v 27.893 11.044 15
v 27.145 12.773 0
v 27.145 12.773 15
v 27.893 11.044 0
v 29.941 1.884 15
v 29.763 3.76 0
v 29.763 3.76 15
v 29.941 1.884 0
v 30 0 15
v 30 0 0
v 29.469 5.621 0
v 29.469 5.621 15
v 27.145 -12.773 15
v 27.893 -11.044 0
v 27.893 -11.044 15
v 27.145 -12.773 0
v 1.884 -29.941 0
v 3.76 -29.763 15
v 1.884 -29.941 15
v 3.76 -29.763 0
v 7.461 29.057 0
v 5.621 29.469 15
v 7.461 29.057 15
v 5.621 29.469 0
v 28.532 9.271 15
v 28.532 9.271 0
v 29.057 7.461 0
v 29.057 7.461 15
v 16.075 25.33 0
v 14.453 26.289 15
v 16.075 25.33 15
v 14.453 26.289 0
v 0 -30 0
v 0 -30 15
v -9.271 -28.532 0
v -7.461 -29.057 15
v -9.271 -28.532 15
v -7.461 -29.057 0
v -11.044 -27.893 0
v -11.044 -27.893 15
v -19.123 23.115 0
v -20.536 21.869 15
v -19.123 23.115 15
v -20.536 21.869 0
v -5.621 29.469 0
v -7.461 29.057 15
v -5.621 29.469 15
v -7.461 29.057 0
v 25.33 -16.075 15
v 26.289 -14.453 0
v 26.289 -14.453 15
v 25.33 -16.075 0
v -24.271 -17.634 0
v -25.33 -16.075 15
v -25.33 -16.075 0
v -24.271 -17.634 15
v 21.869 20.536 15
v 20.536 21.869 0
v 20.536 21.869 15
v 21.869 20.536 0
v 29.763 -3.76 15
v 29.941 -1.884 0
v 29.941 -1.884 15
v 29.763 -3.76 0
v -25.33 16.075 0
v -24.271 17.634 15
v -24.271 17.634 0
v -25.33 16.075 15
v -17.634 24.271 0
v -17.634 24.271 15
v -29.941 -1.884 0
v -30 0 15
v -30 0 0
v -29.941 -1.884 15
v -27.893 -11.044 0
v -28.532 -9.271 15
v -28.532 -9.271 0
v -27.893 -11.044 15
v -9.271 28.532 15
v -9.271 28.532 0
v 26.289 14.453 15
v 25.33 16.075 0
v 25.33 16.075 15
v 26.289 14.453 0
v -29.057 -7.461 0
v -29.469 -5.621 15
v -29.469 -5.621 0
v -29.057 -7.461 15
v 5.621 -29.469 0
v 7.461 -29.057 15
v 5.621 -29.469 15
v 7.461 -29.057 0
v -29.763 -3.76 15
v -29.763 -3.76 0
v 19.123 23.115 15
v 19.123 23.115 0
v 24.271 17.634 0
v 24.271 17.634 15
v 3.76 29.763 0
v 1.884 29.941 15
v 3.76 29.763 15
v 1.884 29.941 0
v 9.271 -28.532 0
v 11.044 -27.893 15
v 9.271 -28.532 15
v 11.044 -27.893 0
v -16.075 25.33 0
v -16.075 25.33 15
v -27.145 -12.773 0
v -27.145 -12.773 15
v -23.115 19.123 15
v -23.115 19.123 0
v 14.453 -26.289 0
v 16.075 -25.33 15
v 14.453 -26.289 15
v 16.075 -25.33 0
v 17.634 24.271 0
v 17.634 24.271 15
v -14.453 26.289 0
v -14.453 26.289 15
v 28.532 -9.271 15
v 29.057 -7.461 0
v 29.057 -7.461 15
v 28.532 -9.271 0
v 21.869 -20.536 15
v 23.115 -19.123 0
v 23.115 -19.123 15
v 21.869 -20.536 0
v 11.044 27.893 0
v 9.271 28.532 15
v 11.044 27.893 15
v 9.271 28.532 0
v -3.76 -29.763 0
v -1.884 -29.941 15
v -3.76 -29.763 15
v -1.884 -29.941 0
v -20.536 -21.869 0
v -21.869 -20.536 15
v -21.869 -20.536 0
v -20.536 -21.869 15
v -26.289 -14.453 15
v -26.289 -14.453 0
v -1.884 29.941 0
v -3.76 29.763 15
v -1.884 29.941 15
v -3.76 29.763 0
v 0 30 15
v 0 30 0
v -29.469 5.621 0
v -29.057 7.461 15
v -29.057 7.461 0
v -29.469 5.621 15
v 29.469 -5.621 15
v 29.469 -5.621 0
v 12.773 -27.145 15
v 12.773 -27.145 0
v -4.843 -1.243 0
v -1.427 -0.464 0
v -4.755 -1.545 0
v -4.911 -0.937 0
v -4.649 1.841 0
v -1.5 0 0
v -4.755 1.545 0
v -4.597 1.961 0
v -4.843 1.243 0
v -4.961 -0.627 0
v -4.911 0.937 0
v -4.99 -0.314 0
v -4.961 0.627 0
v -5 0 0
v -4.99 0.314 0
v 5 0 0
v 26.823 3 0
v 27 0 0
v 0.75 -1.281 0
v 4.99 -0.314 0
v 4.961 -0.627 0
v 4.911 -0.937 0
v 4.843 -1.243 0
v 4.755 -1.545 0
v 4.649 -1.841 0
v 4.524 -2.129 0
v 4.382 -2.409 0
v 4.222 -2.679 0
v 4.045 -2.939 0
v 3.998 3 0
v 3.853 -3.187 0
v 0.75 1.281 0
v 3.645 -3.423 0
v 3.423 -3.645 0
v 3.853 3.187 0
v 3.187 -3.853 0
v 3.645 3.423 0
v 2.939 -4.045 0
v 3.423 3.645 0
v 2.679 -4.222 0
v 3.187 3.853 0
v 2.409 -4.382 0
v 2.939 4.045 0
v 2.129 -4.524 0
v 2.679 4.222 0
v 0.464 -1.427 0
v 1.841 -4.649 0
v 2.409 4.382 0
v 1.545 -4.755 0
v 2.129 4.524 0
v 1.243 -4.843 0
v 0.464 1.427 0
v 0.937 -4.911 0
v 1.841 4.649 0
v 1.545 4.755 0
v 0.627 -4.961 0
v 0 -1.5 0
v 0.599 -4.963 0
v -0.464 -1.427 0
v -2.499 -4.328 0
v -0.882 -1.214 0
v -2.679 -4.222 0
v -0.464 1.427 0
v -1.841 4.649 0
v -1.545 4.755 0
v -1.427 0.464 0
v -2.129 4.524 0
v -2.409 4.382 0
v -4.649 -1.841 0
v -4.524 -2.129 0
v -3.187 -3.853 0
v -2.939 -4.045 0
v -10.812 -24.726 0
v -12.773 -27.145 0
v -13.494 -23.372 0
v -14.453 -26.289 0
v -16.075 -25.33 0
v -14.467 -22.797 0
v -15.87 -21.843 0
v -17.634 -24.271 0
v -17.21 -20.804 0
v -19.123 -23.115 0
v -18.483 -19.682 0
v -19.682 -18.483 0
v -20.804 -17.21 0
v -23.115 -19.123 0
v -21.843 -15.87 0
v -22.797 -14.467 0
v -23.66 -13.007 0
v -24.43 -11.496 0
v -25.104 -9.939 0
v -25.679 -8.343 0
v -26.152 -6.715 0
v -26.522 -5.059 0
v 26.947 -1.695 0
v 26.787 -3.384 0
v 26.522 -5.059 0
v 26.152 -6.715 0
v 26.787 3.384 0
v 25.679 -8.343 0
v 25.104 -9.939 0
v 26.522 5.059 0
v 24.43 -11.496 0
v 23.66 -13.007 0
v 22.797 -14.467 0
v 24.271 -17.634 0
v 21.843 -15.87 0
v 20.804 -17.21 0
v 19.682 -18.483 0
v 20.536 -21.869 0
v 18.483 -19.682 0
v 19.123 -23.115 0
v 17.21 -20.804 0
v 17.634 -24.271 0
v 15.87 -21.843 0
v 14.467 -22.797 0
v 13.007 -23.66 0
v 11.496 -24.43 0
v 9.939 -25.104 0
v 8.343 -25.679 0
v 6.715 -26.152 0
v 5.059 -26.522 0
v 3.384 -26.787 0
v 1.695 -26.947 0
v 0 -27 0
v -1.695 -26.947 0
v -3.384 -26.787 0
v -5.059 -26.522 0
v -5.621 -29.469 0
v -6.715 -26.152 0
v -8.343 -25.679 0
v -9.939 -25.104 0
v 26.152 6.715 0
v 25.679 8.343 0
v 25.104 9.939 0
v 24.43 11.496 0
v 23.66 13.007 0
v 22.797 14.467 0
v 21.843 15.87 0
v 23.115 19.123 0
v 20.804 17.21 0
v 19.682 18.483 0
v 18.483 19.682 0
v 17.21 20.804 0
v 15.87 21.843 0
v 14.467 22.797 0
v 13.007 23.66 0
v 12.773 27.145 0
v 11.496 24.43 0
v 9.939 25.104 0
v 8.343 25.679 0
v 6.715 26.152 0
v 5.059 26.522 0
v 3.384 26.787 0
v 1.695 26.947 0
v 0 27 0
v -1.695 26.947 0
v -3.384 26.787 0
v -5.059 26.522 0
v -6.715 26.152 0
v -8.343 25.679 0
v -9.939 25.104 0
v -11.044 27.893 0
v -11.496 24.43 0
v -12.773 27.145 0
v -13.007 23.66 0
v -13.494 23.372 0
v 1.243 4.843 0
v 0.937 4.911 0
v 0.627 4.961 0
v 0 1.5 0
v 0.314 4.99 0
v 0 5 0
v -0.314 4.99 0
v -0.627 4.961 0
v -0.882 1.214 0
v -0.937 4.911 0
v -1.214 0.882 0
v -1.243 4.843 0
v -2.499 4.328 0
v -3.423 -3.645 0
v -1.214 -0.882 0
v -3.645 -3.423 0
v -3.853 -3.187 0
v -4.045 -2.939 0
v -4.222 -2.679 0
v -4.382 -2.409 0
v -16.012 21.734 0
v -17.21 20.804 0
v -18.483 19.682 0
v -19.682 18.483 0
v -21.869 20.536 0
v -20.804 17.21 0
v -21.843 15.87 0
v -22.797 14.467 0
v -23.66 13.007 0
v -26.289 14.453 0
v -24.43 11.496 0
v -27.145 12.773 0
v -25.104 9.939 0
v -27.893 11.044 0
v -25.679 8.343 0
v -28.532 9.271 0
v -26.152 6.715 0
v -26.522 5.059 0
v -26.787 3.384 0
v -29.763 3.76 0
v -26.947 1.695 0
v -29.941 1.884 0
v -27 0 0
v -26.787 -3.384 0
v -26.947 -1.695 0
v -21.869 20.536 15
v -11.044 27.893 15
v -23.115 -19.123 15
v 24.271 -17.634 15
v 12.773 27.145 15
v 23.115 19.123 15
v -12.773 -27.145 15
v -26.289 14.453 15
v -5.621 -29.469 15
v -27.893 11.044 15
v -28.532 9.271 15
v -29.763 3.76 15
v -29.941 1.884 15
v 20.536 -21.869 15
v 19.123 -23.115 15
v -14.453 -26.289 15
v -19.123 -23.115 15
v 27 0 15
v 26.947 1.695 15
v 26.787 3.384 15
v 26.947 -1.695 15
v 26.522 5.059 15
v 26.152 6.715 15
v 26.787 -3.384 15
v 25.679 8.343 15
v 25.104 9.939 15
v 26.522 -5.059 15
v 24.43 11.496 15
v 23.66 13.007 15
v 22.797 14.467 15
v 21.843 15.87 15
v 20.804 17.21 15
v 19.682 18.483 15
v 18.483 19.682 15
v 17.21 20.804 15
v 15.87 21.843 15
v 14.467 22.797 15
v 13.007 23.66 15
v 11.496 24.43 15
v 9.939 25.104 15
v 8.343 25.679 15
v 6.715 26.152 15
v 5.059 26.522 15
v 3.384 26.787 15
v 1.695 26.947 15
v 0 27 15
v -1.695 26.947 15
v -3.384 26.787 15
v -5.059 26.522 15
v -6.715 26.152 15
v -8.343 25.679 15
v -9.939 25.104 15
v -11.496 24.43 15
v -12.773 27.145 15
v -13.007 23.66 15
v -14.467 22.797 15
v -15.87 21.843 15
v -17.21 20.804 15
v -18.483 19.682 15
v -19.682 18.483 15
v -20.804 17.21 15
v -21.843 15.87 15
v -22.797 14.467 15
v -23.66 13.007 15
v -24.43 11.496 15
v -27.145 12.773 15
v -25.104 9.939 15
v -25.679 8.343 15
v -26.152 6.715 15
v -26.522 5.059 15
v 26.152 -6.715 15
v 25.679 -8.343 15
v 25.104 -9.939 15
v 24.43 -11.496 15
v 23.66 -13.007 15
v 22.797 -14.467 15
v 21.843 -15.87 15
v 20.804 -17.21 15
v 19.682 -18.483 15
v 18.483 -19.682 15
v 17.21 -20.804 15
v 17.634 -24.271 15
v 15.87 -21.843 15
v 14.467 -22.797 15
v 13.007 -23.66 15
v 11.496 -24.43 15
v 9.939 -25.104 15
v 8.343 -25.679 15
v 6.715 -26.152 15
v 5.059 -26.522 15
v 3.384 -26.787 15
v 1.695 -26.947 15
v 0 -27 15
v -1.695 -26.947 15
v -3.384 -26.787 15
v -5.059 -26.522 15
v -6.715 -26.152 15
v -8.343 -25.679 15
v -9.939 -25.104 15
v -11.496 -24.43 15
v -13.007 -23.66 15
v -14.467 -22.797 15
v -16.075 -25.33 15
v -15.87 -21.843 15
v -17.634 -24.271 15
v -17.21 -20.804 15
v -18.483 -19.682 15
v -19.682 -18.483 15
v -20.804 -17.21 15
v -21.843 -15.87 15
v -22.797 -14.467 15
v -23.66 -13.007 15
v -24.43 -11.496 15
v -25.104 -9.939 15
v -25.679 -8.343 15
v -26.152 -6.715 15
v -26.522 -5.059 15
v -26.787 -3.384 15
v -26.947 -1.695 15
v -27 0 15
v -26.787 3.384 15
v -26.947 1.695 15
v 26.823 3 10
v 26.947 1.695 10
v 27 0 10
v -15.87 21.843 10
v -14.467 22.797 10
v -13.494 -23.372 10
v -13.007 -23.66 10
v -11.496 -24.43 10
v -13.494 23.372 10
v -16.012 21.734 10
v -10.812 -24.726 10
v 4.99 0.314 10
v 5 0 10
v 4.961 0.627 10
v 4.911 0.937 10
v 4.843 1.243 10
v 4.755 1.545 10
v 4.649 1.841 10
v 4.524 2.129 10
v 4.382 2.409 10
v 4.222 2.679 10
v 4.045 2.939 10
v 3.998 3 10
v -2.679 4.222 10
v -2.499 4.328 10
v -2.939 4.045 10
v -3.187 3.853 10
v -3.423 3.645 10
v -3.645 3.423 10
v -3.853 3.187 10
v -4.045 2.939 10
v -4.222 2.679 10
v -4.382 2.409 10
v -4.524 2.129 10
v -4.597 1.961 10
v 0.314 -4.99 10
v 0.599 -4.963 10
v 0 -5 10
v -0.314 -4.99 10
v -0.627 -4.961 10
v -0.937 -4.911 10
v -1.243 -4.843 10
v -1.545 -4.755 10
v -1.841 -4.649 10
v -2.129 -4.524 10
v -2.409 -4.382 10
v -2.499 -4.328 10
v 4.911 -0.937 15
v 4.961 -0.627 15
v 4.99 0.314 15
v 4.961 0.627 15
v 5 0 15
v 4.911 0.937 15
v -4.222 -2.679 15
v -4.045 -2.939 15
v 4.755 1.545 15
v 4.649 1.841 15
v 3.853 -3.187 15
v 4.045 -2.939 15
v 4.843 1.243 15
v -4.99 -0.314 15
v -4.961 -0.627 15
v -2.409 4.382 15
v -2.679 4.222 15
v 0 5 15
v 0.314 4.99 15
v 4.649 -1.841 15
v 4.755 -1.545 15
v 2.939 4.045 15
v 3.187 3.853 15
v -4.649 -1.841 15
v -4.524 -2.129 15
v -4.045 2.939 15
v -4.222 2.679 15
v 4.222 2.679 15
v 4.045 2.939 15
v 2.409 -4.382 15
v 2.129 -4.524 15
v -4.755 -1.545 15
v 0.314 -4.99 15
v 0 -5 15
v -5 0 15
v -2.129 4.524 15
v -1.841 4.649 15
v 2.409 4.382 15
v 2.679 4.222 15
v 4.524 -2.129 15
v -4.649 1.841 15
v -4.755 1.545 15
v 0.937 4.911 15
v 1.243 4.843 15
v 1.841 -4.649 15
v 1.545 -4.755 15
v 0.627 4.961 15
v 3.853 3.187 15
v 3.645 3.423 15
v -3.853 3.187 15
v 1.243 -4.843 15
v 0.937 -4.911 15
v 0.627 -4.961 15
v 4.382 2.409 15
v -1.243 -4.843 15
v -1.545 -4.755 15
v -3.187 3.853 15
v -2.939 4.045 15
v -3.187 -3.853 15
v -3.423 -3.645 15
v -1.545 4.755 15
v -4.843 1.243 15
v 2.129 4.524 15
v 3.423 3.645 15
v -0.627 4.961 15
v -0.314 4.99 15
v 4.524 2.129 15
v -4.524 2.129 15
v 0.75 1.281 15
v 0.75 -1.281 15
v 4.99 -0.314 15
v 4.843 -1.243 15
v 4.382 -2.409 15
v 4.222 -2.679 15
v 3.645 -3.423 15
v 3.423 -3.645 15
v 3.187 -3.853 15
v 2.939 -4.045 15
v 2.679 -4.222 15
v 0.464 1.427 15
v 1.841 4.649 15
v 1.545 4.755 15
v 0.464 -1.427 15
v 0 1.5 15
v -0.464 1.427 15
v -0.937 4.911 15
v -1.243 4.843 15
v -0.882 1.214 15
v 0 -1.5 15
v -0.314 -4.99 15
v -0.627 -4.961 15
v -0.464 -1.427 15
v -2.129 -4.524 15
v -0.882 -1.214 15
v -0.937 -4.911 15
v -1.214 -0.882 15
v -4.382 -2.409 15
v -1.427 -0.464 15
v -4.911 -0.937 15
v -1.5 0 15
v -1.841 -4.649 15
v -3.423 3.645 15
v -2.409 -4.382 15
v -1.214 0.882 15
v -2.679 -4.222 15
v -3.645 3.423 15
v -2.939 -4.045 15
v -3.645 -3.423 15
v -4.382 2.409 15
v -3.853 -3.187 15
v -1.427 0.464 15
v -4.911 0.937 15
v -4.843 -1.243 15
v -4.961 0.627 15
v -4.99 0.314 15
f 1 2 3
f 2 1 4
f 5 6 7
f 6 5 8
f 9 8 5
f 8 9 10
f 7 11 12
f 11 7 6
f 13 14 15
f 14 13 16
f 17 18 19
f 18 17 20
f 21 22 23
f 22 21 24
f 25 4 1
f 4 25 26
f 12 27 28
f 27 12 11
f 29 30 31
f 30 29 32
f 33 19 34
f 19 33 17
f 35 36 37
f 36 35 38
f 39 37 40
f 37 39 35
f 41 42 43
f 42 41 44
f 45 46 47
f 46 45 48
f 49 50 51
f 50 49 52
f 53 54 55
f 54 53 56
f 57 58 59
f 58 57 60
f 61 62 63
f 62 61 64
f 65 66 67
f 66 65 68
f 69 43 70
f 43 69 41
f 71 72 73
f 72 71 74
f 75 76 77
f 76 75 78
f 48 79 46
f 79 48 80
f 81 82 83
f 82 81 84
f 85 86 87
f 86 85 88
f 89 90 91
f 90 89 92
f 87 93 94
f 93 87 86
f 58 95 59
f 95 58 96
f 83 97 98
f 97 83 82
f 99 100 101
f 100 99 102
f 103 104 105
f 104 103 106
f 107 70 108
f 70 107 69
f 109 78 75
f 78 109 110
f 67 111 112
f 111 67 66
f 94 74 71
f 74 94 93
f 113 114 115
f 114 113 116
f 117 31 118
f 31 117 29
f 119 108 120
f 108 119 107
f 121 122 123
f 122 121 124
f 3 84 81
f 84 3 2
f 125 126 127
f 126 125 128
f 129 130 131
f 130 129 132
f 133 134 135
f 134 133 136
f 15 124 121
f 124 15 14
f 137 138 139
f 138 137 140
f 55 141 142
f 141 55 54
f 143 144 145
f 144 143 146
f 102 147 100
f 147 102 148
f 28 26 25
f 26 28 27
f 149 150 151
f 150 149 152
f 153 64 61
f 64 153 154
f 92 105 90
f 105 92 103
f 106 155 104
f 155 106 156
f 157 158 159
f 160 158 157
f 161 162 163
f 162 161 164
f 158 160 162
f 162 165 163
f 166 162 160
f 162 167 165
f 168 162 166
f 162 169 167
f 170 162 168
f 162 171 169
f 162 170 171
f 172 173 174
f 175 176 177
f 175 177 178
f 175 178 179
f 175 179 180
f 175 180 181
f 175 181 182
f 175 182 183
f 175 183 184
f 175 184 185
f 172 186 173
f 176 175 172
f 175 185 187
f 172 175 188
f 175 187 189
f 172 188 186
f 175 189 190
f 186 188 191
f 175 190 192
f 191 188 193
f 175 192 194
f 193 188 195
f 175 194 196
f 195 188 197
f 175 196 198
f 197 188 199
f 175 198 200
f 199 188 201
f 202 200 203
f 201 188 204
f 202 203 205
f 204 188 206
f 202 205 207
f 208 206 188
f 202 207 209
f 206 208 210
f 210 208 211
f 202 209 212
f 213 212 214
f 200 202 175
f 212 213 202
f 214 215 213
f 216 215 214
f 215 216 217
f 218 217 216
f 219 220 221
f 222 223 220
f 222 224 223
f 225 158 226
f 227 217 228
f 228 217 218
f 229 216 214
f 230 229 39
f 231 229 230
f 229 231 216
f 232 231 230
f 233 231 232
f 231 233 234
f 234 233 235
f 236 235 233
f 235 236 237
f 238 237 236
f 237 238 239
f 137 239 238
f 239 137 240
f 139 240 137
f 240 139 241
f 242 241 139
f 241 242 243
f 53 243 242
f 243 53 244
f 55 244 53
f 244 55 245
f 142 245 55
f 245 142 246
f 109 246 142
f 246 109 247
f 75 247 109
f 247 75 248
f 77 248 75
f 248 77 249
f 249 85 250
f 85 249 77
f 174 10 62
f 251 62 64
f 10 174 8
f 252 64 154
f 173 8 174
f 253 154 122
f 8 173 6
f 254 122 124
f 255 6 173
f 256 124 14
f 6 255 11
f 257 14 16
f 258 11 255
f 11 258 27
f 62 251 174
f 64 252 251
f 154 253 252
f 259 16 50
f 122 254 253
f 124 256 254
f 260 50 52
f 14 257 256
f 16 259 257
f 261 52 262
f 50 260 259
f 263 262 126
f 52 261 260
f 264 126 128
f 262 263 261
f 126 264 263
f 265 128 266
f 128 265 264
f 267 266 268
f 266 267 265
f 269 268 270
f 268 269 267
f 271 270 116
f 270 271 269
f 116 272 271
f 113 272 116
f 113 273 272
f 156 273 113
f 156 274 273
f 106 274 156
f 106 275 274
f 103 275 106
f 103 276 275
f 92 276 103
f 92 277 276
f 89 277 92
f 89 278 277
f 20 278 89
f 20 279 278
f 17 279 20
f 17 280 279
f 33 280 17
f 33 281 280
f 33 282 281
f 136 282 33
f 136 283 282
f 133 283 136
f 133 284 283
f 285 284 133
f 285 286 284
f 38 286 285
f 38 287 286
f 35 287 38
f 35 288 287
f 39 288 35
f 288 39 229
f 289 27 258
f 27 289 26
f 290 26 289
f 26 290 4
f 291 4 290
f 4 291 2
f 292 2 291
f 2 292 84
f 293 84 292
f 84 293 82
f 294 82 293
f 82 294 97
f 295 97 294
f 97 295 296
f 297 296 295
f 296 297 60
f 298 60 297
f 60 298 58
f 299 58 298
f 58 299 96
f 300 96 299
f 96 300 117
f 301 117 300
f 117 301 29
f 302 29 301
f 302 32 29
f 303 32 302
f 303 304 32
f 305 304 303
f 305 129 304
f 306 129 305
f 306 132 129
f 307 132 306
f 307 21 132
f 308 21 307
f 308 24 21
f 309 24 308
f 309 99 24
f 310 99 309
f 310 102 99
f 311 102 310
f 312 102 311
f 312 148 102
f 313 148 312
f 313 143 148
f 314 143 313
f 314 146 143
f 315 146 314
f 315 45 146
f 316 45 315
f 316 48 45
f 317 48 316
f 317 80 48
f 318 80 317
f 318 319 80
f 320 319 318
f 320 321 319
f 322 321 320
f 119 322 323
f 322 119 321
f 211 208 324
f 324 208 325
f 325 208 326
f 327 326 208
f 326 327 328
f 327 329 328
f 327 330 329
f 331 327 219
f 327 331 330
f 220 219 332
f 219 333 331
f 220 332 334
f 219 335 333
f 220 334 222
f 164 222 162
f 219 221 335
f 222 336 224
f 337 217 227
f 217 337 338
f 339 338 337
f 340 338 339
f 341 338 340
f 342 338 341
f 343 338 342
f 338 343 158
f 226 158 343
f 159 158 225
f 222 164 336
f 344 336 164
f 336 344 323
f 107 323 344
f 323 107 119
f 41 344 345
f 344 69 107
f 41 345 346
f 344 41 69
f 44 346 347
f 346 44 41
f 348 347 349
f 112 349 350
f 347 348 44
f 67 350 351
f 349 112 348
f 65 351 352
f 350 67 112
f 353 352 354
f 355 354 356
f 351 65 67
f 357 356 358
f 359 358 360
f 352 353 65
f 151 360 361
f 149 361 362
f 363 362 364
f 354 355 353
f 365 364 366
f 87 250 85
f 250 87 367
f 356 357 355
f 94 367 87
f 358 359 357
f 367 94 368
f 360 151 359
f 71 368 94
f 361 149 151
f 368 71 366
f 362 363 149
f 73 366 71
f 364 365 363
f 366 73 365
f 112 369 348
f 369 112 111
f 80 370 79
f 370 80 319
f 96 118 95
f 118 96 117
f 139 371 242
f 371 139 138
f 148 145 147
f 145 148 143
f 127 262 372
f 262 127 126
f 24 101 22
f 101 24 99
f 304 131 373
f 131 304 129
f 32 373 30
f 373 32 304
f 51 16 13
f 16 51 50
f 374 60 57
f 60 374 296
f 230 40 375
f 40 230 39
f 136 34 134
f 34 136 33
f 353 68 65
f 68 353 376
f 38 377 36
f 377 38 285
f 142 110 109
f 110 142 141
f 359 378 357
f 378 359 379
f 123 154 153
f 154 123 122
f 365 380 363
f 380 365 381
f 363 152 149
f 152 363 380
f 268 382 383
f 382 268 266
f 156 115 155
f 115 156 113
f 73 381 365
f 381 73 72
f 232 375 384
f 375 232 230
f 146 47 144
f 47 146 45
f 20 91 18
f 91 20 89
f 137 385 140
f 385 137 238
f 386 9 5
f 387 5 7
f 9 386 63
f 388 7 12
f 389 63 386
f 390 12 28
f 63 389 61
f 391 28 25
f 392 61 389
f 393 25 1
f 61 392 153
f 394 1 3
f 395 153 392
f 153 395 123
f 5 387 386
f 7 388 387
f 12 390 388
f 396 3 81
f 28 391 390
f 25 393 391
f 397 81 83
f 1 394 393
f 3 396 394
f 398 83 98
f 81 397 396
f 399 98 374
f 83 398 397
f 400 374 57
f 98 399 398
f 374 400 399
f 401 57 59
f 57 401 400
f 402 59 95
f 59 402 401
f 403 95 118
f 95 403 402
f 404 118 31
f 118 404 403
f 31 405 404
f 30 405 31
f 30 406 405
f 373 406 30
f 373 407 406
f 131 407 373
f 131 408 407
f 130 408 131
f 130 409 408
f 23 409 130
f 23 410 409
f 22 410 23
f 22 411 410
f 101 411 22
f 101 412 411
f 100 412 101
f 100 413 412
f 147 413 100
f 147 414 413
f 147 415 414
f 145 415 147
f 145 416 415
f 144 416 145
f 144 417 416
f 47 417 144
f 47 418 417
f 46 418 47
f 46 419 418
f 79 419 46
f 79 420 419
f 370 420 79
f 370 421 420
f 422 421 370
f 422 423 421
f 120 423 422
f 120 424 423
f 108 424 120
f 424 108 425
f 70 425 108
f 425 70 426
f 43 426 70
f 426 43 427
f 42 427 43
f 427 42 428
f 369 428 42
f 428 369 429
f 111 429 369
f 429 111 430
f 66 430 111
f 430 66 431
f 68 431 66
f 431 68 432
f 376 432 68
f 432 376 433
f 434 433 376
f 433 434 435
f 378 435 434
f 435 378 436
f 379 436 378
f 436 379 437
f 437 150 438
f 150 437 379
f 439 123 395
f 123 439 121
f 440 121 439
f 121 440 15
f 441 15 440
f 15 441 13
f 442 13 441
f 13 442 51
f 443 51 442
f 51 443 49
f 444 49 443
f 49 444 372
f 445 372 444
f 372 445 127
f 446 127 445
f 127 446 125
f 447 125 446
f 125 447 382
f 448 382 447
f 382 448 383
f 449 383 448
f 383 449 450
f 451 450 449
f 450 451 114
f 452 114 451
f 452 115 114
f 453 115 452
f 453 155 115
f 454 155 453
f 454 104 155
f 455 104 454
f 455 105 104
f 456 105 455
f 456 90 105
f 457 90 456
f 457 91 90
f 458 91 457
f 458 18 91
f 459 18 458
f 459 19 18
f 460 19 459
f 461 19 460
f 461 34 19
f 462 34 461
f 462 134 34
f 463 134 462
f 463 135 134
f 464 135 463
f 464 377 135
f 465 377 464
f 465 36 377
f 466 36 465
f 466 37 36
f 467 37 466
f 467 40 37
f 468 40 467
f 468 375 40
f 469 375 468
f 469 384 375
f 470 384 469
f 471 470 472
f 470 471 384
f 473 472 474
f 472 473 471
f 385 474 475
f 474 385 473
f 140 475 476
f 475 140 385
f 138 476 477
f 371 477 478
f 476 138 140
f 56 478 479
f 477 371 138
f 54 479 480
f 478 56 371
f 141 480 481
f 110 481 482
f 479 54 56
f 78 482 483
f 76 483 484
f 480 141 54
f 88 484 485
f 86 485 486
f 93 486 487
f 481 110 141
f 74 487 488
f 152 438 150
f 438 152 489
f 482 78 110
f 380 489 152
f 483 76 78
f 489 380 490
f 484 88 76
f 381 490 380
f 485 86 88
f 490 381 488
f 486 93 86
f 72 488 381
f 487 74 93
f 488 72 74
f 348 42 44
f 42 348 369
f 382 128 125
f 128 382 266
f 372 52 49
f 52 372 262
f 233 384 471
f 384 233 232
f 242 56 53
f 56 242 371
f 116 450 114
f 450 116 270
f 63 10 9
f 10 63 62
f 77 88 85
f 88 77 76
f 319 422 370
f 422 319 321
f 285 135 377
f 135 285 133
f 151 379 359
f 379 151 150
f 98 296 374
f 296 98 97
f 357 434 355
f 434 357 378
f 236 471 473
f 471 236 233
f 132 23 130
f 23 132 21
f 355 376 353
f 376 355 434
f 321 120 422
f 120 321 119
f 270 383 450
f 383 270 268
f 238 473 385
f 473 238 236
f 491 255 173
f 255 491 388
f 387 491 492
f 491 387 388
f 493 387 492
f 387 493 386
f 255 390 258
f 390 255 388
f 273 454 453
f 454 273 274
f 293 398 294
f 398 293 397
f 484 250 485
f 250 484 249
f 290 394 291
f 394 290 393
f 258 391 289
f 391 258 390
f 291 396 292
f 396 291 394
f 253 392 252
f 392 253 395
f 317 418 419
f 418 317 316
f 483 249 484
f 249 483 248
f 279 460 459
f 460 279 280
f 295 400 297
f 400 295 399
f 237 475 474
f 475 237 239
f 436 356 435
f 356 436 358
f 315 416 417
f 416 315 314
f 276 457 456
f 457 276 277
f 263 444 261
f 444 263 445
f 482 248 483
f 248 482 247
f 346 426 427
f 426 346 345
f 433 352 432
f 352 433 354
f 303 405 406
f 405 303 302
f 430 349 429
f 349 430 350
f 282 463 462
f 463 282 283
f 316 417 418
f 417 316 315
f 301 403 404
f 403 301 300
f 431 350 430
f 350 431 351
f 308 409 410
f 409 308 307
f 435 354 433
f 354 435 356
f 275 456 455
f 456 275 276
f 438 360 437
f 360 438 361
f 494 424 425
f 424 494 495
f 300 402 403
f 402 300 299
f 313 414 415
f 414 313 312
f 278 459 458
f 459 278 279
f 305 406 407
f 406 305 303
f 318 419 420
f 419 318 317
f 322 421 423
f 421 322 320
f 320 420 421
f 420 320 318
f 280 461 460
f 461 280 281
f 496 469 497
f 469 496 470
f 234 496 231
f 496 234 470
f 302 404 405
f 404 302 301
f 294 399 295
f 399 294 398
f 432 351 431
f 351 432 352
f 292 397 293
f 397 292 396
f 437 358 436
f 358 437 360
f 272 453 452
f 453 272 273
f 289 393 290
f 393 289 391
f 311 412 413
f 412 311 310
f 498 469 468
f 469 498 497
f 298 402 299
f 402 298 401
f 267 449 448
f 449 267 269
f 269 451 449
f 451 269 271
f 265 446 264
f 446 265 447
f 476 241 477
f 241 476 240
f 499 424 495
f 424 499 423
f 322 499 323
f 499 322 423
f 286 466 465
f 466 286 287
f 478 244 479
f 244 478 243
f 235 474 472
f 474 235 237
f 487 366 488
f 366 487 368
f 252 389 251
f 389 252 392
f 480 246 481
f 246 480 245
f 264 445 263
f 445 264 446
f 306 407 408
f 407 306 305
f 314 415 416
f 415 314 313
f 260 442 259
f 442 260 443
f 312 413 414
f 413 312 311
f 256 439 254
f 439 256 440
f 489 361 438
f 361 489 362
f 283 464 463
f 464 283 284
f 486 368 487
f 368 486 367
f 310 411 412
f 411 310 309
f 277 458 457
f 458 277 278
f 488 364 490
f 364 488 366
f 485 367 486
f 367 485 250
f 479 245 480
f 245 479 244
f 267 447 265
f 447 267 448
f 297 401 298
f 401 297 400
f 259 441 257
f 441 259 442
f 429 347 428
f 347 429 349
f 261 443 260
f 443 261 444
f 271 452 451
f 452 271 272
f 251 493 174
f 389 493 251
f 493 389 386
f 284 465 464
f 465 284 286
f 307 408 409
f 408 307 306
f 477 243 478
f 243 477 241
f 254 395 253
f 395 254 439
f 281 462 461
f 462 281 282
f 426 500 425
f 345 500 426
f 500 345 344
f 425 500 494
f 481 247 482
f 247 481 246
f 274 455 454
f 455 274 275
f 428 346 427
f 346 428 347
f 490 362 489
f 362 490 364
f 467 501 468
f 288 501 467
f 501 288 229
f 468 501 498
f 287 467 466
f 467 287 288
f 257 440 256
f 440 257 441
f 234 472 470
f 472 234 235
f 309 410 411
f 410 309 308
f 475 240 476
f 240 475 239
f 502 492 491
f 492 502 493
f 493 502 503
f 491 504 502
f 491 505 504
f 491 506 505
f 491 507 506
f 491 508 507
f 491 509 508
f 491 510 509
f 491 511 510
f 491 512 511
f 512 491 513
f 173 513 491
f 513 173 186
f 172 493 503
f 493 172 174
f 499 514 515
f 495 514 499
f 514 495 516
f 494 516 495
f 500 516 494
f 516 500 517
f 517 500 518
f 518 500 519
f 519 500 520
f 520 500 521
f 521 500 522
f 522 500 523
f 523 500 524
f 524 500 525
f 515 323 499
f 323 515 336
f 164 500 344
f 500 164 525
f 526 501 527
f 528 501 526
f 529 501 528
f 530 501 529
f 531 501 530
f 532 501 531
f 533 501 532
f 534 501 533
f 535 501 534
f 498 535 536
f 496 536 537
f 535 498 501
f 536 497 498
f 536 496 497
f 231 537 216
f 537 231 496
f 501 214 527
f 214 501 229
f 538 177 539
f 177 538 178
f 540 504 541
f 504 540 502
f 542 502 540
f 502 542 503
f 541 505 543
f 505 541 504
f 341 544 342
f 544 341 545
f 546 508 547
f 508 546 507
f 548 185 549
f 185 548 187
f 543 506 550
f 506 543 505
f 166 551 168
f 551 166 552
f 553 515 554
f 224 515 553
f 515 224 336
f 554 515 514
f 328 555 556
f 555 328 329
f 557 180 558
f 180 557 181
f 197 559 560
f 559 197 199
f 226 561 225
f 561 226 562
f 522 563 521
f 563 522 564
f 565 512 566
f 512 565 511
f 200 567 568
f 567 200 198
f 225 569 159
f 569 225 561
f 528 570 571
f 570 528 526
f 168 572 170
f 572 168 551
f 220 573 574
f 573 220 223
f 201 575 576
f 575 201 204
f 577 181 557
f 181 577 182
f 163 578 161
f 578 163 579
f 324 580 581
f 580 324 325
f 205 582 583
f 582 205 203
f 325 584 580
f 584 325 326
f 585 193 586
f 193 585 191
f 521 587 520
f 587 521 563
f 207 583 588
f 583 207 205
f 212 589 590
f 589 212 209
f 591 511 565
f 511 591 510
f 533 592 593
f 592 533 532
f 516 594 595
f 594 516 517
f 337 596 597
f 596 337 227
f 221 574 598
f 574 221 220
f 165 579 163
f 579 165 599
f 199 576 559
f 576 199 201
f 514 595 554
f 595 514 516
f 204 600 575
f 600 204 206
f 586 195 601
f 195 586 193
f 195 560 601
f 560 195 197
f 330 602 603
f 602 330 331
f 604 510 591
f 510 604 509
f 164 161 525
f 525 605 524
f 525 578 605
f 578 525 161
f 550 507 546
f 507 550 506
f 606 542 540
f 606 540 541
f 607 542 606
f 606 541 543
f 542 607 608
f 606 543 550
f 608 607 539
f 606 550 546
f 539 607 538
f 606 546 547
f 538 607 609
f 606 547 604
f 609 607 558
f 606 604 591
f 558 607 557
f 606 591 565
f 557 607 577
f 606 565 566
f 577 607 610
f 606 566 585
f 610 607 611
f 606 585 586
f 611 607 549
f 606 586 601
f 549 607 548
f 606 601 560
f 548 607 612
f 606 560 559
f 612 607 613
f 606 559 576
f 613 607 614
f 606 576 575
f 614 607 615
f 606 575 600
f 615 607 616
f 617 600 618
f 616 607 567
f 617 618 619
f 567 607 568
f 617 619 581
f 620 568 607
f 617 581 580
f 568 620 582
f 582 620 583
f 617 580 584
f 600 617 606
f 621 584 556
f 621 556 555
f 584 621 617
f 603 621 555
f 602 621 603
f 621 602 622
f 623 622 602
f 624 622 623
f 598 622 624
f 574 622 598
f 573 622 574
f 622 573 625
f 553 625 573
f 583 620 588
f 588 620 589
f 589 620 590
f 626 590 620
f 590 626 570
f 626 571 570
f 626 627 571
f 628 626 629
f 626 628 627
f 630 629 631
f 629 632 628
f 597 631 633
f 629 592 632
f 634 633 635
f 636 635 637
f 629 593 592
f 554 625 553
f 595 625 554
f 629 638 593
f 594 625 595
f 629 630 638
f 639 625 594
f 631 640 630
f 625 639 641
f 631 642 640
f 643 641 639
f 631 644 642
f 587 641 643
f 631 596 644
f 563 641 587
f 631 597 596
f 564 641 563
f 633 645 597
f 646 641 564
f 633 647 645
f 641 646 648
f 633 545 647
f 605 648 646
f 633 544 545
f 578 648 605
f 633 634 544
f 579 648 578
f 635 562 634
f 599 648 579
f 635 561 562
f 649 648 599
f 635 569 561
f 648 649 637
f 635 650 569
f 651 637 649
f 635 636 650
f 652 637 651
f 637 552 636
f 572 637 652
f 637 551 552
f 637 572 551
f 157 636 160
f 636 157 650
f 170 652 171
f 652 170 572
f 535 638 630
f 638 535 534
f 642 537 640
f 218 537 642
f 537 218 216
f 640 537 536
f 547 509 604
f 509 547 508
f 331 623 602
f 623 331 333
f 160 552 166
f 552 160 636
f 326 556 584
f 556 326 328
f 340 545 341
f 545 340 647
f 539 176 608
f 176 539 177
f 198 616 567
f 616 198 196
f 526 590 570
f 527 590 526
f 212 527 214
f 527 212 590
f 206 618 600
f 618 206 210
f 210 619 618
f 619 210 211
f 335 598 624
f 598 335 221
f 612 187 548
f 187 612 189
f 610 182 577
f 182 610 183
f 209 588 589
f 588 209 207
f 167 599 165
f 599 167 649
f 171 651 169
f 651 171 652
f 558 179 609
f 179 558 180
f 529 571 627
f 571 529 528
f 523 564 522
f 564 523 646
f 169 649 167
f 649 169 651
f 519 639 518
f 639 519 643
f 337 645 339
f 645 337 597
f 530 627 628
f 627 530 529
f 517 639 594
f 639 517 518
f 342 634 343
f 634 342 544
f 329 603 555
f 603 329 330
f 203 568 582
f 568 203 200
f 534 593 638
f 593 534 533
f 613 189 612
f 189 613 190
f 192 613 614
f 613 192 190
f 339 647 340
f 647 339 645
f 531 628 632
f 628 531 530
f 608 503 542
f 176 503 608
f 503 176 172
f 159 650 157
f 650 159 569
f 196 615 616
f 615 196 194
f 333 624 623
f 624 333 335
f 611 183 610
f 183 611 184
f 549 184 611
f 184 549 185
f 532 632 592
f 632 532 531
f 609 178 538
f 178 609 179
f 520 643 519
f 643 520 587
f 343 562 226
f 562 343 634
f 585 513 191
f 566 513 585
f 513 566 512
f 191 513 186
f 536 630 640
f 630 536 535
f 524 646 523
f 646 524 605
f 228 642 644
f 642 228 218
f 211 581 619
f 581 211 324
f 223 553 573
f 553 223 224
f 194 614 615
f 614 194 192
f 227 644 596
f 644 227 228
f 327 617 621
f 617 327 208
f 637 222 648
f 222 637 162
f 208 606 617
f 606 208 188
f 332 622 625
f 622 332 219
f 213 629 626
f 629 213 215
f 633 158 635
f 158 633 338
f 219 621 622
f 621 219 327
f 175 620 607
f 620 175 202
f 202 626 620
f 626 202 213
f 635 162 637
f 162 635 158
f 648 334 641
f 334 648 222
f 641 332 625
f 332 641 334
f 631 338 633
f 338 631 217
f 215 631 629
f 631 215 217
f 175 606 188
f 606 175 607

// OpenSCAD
difference() {
  wheel();
  //generic_axis();
  //motor1_axis();
  //motor2_axis();
  //motor3_axis();
  motor4_axis();
}

module generic_axis(length=17) {
  // 1мм диаметр
  translate([0,0,-1])
    cylinder(h=length, r=0.5, $fn=20);
}
module motor1_axis(length=17) {
  // 1,5мм диаметр
  translate([0,0,-1])
    cylinder(h=length, r=0.75, $fn=20);
}
module motor2_axis(length=17) {
  // 5мм диаметр, 
  // срезы по бокам (3мм сердцевина)
  translate([0,0,-1])
  difference() {
    cylinder(h=length, r=2.5, $fn=20);
    translate([1.5, -2.5, 0]) 
      cube([2.5, 5, length]);
    translate([-2.5-1.5, -2.5, 0]) 
      cube([2.5, 5, length]);
  }
}
module motor3_axis(length=17) {
  // 1,5мм диаметр
  translate([0,0,-1])
    cylinder(h=length, r=0.75, $fn=20);
}
module motor4_axis(length=17) {
  // 3мм диаметр,
  // срез с одного бока 1мм
  translate([0,0,-1])
  difference() {
    cylinder(h=length, r=1.5, $fn=20);
    translate([0.75, -1.5, 0]) 
      cube([2, 3, length]);
  }
}

/* Колесо */
module wheel() {
  // внешний обод
  difference() {
    cylinder(h=15, r=30, $fn=100);
    translate([0,0,-1])
      cylinder(h=17, r=27, $fn=100);
  }

  // внутренний вал
  cylinder(h=15, r=5, $fn=100);

  // спицы
  for(angle = [0, 120, 240]) {
    rotate(a=angle) 
      cube([29, 3, 10]);
  }

}
